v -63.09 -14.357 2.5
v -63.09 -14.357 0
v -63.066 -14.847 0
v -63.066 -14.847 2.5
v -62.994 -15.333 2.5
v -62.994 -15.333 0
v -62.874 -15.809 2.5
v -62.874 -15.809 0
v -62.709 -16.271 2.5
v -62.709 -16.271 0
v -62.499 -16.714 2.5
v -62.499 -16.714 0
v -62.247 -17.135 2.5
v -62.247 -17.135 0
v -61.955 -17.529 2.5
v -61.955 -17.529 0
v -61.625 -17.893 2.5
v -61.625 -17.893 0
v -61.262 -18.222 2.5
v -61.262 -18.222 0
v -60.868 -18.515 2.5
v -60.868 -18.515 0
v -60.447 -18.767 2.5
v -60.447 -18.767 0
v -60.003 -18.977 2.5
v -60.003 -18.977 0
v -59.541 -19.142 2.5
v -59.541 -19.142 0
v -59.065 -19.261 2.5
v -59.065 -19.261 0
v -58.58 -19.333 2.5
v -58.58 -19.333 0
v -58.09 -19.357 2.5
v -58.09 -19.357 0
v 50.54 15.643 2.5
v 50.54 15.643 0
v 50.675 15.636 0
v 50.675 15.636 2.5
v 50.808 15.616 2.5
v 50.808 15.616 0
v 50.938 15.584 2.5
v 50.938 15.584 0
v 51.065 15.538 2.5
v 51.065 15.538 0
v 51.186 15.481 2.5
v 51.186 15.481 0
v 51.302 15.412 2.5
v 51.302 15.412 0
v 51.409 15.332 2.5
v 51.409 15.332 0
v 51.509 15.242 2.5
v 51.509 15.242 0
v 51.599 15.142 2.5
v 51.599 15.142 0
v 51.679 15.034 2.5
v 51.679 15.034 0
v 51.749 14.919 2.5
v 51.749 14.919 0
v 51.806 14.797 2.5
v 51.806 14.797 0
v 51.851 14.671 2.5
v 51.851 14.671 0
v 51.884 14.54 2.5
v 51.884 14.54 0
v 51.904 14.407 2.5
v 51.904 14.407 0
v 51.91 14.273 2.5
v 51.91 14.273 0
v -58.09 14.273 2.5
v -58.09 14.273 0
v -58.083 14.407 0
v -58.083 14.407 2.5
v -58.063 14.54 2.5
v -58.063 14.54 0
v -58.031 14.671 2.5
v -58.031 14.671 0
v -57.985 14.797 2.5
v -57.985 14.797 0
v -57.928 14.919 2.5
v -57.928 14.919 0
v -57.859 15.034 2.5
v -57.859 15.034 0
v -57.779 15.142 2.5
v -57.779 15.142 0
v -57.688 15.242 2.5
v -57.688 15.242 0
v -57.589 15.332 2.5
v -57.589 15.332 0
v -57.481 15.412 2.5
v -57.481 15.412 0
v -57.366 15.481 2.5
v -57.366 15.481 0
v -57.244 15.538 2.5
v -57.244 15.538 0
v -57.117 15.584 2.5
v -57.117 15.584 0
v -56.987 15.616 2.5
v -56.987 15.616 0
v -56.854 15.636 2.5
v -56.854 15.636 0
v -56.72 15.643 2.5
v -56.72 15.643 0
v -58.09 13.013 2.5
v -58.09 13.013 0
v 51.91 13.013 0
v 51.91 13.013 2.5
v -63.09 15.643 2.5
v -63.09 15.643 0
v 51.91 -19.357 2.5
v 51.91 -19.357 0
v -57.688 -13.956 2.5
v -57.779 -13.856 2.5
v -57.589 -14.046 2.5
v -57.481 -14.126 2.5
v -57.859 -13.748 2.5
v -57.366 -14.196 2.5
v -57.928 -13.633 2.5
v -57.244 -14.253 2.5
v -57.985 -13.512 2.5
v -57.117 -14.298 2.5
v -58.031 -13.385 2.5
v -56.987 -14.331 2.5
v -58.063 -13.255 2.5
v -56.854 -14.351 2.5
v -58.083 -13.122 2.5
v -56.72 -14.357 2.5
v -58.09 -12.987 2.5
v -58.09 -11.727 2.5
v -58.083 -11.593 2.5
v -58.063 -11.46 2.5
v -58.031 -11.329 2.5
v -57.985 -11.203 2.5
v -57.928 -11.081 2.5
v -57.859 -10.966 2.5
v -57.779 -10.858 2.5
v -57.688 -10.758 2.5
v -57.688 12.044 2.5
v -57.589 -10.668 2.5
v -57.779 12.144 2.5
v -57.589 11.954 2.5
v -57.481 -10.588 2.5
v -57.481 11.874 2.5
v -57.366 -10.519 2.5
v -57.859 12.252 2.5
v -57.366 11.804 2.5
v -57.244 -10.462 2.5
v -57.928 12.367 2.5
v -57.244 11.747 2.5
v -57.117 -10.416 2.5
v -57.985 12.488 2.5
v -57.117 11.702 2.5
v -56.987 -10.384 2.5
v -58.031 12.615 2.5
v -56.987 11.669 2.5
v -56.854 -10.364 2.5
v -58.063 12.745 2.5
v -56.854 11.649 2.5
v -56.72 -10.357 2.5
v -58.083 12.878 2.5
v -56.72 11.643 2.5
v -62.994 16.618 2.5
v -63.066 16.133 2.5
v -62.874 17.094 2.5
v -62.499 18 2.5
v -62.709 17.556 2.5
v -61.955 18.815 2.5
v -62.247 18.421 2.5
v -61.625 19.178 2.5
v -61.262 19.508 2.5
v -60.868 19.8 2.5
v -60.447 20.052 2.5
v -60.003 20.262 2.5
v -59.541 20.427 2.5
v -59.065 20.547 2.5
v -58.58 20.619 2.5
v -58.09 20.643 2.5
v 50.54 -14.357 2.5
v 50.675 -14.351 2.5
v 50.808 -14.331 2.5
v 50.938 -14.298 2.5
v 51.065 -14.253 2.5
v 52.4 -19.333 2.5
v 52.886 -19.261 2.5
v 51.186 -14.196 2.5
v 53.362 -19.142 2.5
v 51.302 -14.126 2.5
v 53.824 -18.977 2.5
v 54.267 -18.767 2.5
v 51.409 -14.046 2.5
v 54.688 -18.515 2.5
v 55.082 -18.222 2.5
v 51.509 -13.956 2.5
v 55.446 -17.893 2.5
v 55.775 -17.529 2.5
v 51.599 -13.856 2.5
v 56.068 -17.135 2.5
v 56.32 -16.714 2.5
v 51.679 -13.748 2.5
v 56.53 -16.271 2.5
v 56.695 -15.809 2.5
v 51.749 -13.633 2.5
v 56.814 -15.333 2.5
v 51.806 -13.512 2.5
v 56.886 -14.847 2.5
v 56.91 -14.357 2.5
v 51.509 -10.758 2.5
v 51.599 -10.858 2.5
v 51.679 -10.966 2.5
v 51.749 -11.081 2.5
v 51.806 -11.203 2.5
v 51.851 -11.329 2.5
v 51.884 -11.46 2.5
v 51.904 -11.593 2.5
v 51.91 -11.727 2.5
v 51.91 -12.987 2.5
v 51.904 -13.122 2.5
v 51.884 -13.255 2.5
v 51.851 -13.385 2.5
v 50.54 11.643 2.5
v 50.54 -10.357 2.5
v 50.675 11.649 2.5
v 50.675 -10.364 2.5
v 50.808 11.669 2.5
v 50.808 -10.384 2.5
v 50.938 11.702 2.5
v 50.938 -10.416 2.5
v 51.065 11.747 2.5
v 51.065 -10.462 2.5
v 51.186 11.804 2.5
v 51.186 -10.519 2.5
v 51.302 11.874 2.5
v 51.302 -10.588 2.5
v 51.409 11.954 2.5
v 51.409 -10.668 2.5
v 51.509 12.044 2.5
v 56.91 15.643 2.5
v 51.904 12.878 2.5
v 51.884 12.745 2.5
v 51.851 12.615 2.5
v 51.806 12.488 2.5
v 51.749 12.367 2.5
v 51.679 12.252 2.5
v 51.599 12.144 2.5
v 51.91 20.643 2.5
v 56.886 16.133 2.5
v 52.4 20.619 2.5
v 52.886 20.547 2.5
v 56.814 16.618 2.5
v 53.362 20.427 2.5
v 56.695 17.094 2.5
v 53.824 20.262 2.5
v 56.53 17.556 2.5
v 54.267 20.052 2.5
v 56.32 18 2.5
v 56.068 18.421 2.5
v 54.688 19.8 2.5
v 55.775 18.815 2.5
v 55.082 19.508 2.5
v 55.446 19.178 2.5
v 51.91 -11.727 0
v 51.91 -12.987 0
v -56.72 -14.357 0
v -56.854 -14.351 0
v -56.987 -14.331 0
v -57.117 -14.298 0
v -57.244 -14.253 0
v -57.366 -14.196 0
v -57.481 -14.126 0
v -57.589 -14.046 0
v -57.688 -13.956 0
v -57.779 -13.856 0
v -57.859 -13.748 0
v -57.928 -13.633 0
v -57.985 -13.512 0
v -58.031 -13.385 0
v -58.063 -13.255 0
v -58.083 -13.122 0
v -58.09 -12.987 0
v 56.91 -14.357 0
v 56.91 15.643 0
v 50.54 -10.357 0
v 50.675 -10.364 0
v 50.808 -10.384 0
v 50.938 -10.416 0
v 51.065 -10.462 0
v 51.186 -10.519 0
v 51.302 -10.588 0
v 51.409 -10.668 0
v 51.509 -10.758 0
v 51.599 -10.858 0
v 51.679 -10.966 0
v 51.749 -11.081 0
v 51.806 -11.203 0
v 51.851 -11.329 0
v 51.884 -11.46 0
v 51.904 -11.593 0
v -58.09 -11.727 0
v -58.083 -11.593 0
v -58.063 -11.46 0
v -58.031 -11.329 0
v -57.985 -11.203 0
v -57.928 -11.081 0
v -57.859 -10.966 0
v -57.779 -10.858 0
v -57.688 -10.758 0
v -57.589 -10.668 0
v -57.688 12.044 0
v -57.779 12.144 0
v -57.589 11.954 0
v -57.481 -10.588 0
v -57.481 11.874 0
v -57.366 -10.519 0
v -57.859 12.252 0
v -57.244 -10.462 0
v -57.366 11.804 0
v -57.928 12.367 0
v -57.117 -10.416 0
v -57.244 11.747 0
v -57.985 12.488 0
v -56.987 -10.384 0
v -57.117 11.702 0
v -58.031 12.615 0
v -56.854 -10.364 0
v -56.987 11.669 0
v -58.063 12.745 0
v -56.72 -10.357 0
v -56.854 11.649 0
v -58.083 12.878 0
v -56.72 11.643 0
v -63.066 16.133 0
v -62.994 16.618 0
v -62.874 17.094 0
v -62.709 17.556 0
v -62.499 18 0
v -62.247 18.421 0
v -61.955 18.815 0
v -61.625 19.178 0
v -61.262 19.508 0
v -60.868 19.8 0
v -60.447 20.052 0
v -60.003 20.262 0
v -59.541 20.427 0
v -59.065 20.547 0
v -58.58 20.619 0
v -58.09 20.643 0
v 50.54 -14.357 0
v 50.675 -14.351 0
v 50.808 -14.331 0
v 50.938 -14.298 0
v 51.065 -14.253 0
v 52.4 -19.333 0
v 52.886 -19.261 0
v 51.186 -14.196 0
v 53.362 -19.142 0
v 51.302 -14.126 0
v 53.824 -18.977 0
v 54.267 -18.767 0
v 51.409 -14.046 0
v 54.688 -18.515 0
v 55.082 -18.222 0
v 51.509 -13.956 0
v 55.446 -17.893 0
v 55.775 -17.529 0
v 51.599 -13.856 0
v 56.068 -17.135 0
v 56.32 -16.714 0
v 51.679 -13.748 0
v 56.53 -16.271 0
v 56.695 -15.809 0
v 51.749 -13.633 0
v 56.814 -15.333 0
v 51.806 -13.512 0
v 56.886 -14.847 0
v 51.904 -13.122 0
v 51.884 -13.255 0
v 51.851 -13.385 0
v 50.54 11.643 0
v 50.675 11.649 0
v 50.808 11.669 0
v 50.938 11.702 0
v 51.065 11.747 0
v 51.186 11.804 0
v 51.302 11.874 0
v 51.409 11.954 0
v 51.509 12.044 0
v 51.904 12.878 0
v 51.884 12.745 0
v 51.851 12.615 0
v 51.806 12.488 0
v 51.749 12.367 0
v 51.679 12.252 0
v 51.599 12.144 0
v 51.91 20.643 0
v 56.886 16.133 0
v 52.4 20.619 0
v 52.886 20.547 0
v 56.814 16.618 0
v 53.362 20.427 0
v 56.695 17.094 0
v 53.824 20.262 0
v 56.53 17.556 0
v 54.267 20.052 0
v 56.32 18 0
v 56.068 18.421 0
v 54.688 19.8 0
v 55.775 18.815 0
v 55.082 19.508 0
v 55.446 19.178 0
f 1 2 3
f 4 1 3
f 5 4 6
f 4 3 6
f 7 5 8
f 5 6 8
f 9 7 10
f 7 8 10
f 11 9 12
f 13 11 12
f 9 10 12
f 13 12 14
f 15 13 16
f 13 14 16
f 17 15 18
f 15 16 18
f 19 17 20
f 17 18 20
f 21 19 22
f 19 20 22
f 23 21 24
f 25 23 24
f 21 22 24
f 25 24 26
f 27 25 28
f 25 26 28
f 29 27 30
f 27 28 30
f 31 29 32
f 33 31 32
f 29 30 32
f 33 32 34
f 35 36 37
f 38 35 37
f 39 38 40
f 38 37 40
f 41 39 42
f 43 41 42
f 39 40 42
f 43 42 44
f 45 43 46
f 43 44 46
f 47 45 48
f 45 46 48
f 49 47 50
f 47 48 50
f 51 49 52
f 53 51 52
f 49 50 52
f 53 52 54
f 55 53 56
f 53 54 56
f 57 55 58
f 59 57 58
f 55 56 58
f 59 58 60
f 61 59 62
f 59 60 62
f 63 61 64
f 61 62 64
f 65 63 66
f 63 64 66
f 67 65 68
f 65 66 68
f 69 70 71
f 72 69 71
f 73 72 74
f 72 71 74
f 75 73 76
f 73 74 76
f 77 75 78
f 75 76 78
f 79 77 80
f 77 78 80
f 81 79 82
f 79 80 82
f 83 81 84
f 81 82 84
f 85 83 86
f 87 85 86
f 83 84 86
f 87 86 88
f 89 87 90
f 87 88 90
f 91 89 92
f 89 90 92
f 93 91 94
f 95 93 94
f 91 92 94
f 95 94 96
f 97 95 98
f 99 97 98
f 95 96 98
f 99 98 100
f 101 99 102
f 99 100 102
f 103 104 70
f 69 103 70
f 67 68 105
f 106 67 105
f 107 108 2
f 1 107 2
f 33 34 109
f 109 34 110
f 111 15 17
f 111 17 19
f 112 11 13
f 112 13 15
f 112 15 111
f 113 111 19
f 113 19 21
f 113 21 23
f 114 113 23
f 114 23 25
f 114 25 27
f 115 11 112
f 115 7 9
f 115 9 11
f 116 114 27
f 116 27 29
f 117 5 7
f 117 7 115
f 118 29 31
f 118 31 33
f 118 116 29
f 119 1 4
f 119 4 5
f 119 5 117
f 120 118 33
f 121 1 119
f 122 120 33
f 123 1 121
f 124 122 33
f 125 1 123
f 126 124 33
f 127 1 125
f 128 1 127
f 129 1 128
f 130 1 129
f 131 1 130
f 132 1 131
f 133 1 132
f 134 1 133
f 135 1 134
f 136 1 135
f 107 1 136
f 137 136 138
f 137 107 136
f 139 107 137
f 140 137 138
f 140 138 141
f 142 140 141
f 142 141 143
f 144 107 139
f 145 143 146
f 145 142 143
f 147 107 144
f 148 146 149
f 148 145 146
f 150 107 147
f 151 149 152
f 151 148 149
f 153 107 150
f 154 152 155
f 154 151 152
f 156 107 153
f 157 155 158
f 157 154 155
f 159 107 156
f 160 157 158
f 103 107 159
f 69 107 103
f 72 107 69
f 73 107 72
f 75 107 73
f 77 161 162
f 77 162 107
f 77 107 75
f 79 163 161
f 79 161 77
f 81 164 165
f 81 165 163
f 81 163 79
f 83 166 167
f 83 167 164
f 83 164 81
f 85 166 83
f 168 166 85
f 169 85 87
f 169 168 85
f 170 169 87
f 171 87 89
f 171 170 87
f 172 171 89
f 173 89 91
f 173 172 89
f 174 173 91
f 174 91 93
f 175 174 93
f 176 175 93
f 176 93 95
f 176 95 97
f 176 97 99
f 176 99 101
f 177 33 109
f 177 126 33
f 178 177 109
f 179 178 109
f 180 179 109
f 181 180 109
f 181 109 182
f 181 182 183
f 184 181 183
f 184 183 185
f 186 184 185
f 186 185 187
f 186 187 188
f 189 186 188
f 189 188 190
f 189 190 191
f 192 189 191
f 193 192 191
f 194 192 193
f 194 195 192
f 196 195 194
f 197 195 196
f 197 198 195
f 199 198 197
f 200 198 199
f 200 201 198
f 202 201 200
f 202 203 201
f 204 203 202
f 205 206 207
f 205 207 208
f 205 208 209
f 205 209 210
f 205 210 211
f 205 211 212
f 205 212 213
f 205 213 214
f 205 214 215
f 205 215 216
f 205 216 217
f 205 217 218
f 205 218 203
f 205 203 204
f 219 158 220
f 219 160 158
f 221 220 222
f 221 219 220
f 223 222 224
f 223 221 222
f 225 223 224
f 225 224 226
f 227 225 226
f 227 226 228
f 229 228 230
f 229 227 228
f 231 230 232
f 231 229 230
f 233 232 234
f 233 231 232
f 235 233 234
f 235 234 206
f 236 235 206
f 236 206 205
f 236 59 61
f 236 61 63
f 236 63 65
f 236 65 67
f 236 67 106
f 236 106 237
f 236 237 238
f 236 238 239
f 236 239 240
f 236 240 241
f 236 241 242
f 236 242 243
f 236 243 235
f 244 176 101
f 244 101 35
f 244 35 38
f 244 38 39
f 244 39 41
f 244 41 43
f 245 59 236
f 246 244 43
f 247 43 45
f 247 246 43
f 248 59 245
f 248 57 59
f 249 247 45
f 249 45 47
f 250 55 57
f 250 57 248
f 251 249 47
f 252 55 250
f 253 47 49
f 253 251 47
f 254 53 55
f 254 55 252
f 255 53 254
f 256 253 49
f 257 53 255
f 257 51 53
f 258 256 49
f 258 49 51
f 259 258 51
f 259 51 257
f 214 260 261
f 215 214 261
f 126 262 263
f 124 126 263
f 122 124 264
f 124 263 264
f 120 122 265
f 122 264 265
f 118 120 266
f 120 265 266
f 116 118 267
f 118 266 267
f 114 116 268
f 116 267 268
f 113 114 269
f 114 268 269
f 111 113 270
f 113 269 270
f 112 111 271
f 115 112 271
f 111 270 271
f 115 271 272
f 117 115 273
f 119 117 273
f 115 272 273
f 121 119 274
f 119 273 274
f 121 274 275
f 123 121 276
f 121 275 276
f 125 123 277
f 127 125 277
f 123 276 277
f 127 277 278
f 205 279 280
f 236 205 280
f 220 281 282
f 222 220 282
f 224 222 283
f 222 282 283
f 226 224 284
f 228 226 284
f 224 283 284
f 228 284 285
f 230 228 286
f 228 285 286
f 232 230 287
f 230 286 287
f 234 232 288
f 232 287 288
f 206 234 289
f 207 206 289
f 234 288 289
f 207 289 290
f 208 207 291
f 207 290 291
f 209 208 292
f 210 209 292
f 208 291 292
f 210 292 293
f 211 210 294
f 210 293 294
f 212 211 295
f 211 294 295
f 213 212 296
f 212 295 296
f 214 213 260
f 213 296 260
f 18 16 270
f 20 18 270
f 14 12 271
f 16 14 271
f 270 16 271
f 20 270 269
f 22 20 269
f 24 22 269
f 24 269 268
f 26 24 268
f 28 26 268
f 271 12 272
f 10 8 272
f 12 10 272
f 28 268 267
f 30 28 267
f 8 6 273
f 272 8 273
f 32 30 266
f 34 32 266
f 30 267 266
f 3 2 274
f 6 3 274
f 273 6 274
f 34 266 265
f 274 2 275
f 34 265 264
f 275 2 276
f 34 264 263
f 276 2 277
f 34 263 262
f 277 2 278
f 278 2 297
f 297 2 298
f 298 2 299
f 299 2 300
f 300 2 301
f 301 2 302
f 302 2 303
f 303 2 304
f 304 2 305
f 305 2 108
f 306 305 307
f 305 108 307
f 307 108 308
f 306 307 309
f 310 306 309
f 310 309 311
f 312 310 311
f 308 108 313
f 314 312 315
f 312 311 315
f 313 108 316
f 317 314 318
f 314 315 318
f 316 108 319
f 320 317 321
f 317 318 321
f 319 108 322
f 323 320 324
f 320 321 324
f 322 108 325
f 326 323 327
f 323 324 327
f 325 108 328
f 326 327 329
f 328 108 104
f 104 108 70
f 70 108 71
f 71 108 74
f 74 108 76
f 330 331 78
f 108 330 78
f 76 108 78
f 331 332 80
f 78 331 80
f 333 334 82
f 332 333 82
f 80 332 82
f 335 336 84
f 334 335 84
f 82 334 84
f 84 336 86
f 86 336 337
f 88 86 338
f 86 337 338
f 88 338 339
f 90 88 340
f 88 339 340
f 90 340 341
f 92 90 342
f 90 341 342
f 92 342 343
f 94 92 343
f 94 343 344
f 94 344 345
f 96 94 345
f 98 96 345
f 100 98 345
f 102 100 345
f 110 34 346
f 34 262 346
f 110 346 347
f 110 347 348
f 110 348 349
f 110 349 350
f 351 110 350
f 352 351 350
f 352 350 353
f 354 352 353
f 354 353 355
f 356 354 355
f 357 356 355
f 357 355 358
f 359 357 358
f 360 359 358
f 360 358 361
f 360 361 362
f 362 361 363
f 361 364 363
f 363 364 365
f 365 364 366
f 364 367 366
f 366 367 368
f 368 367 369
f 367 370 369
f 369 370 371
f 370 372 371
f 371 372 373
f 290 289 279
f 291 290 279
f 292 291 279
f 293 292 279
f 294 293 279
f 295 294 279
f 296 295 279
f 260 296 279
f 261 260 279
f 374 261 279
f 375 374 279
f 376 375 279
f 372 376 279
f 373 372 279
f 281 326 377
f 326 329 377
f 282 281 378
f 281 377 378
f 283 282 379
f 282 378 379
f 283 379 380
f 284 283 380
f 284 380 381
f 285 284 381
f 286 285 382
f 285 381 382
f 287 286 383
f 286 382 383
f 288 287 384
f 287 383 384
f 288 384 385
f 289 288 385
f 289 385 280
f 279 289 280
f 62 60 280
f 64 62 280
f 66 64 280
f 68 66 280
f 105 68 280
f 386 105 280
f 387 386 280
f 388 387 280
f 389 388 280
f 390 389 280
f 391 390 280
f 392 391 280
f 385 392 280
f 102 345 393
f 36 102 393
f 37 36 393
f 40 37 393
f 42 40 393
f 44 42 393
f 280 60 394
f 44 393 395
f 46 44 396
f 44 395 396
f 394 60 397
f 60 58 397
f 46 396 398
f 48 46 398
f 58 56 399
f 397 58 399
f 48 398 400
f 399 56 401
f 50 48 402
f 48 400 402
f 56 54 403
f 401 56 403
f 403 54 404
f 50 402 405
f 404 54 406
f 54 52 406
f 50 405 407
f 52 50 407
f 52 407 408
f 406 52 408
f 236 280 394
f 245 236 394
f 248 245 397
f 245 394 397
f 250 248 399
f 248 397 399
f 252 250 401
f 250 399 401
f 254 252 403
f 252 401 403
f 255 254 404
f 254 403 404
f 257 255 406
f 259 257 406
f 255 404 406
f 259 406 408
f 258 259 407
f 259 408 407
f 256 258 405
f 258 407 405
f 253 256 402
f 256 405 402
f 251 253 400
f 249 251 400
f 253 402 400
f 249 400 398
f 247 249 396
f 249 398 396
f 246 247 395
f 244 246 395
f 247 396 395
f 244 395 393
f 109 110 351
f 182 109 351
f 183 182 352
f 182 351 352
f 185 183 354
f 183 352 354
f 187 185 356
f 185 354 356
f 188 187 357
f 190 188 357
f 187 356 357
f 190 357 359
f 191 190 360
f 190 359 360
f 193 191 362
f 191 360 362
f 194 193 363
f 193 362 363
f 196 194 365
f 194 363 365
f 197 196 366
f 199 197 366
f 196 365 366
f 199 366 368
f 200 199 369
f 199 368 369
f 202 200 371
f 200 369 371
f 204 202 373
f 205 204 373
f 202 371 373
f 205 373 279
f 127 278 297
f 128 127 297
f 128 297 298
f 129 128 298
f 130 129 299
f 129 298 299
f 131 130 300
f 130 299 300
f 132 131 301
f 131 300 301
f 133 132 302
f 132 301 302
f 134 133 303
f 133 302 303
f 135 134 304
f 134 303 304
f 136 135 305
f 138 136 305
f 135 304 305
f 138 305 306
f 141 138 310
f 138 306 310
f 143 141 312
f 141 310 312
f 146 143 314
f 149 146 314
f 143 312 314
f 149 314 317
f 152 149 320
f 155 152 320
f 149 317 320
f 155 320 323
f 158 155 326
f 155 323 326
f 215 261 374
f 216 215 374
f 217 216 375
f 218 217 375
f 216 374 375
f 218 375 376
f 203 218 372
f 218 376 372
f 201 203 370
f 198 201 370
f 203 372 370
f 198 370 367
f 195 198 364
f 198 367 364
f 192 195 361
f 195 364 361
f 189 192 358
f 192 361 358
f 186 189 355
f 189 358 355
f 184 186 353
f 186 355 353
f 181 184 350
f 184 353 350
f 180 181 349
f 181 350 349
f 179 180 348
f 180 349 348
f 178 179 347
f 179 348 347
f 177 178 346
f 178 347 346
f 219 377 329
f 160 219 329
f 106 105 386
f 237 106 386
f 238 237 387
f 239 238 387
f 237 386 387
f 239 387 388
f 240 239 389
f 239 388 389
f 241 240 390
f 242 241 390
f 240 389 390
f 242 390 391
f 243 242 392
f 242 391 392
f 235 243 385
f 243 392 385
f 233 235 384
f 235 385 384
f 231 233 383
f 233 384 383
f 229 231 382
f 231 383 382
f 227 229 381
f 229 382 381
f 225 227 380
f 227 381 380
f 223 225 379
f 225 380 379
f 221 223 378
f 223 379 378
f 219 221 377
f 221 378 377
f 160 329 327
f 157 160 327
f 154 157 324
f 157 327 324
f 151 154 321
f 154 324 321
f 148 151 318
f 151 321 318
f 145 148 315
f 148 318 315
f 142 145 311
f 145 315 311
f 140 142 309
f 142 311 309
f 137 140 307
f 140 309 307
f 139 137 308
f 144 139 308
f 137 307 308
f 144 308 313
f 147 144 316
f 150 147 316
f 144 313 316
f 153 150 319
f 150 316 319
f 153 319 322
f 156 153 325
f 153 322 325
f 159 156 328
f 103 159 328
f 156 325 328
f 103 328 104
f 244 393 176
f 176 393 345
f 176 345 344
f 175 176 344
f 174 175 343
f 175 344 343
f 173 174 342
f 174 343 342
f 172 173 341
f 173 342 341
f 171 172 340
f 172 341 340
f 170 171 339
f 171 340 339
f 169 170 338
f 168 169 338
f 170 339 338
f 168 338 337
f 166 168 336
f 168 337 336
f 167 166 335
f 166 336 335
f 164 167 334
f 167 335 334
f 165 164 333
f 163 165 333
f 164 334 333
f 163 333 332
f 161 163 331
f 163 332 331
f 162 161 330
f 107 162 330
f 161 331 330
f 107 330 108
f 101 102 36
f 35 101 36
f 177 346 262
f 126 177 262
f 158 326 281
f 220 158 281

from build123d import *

# Parameters (mm, degrees)
F1_DEPTH = 2.5


with BuildPart() as f1:
    # F0 (on Top) → F1 (new body)
    with BuildSketch(Plane.XY):
        with BuildLine():
            Line((51.910336, 20.642742), (-58.089664, 20.642742))
            ThreePointArc((-58.089664, 20.642742), (-61.625198, 19.178275), (-63.089664, 15.642742))
            Line((-63.089664, 15.642742), (-63.089664, -14.357258))
            ThreePointArc((-63.089664, -14.357258), (-61.625198, -17.892792), (-58.089664, -19.357258))
            Line((-58.089664, -19.357258), (51.910336, -19.357258))
            ThreePointArc((51.910336, -19.357258), (55.44587, -17.892792), (56.910336, -14.357258))
            Line((56.910336, -14.357258), (56.910336, 15.642742))
            ThreePointArc((56.910336, 15.642742), (55.44587, 19.178275), (51.910336, 20.642742))
        make_face()
        with BuildLine():
            Line((50.540434, -14.357258), (-56.719762, -14.357258))
            ThreePointArc((-56.719762, -14.357258), (-57.688429, -13.956023), (-58.089664, -12.987356))
            Line((-58.089664, -12.987356), (-58.089664, -11.727161))
            ThreePointArc((-58.089664, -11.727161), (-57.688429, -10.758493), (-56.719762, -10.357258))
            Line((-56.719762, -10.357258), (50.540434, -10.357258))
            ThreePointArc((50.540434, -10.357258), (51.509101, -10.758493), (51.910336, -11.727161))
            Line((51.910336, -11.727161), (51.910336, -12.987356))
            ThreePointArc((51.910336, -12.987356), (51.509101, -13.956023), (50.540434, -14.357258))
        make_face(mode=Mode.SUBTRACT)
        with BuildLine():
            ThreePointArc((-58.089664, 14.272839), (-57.688429, 15.241507), (-56.719762, 15.642742))
            Line((-56.719762, 15.642742), (50.540434, 15.642742))
            ThreePointArc((50.540434, 15.642742), (51.509101, 15.241507), (51.910336, 14.272839))
            Line((51.910336, 14.272839), (51.910336, 13.012644))
            ThreePointArc((51.910336, 13.012644), (51.509101, 12.043977), (50.540434, 11.642742))
            Line((50.540434, 11.642742), (-56.719762, 11.642742))
            ThreePointArc((-56.719762, 11.642742), (-57.688429, 12.043977), (-58.089664, 13.012644))
            Line((-58.089664, 13.012644), (-58.089664, 14.272839))
        make_face(mode=Mode.SUBTRACT)
    extrude(amount=F1_DEPTH)


solid = f1.part
